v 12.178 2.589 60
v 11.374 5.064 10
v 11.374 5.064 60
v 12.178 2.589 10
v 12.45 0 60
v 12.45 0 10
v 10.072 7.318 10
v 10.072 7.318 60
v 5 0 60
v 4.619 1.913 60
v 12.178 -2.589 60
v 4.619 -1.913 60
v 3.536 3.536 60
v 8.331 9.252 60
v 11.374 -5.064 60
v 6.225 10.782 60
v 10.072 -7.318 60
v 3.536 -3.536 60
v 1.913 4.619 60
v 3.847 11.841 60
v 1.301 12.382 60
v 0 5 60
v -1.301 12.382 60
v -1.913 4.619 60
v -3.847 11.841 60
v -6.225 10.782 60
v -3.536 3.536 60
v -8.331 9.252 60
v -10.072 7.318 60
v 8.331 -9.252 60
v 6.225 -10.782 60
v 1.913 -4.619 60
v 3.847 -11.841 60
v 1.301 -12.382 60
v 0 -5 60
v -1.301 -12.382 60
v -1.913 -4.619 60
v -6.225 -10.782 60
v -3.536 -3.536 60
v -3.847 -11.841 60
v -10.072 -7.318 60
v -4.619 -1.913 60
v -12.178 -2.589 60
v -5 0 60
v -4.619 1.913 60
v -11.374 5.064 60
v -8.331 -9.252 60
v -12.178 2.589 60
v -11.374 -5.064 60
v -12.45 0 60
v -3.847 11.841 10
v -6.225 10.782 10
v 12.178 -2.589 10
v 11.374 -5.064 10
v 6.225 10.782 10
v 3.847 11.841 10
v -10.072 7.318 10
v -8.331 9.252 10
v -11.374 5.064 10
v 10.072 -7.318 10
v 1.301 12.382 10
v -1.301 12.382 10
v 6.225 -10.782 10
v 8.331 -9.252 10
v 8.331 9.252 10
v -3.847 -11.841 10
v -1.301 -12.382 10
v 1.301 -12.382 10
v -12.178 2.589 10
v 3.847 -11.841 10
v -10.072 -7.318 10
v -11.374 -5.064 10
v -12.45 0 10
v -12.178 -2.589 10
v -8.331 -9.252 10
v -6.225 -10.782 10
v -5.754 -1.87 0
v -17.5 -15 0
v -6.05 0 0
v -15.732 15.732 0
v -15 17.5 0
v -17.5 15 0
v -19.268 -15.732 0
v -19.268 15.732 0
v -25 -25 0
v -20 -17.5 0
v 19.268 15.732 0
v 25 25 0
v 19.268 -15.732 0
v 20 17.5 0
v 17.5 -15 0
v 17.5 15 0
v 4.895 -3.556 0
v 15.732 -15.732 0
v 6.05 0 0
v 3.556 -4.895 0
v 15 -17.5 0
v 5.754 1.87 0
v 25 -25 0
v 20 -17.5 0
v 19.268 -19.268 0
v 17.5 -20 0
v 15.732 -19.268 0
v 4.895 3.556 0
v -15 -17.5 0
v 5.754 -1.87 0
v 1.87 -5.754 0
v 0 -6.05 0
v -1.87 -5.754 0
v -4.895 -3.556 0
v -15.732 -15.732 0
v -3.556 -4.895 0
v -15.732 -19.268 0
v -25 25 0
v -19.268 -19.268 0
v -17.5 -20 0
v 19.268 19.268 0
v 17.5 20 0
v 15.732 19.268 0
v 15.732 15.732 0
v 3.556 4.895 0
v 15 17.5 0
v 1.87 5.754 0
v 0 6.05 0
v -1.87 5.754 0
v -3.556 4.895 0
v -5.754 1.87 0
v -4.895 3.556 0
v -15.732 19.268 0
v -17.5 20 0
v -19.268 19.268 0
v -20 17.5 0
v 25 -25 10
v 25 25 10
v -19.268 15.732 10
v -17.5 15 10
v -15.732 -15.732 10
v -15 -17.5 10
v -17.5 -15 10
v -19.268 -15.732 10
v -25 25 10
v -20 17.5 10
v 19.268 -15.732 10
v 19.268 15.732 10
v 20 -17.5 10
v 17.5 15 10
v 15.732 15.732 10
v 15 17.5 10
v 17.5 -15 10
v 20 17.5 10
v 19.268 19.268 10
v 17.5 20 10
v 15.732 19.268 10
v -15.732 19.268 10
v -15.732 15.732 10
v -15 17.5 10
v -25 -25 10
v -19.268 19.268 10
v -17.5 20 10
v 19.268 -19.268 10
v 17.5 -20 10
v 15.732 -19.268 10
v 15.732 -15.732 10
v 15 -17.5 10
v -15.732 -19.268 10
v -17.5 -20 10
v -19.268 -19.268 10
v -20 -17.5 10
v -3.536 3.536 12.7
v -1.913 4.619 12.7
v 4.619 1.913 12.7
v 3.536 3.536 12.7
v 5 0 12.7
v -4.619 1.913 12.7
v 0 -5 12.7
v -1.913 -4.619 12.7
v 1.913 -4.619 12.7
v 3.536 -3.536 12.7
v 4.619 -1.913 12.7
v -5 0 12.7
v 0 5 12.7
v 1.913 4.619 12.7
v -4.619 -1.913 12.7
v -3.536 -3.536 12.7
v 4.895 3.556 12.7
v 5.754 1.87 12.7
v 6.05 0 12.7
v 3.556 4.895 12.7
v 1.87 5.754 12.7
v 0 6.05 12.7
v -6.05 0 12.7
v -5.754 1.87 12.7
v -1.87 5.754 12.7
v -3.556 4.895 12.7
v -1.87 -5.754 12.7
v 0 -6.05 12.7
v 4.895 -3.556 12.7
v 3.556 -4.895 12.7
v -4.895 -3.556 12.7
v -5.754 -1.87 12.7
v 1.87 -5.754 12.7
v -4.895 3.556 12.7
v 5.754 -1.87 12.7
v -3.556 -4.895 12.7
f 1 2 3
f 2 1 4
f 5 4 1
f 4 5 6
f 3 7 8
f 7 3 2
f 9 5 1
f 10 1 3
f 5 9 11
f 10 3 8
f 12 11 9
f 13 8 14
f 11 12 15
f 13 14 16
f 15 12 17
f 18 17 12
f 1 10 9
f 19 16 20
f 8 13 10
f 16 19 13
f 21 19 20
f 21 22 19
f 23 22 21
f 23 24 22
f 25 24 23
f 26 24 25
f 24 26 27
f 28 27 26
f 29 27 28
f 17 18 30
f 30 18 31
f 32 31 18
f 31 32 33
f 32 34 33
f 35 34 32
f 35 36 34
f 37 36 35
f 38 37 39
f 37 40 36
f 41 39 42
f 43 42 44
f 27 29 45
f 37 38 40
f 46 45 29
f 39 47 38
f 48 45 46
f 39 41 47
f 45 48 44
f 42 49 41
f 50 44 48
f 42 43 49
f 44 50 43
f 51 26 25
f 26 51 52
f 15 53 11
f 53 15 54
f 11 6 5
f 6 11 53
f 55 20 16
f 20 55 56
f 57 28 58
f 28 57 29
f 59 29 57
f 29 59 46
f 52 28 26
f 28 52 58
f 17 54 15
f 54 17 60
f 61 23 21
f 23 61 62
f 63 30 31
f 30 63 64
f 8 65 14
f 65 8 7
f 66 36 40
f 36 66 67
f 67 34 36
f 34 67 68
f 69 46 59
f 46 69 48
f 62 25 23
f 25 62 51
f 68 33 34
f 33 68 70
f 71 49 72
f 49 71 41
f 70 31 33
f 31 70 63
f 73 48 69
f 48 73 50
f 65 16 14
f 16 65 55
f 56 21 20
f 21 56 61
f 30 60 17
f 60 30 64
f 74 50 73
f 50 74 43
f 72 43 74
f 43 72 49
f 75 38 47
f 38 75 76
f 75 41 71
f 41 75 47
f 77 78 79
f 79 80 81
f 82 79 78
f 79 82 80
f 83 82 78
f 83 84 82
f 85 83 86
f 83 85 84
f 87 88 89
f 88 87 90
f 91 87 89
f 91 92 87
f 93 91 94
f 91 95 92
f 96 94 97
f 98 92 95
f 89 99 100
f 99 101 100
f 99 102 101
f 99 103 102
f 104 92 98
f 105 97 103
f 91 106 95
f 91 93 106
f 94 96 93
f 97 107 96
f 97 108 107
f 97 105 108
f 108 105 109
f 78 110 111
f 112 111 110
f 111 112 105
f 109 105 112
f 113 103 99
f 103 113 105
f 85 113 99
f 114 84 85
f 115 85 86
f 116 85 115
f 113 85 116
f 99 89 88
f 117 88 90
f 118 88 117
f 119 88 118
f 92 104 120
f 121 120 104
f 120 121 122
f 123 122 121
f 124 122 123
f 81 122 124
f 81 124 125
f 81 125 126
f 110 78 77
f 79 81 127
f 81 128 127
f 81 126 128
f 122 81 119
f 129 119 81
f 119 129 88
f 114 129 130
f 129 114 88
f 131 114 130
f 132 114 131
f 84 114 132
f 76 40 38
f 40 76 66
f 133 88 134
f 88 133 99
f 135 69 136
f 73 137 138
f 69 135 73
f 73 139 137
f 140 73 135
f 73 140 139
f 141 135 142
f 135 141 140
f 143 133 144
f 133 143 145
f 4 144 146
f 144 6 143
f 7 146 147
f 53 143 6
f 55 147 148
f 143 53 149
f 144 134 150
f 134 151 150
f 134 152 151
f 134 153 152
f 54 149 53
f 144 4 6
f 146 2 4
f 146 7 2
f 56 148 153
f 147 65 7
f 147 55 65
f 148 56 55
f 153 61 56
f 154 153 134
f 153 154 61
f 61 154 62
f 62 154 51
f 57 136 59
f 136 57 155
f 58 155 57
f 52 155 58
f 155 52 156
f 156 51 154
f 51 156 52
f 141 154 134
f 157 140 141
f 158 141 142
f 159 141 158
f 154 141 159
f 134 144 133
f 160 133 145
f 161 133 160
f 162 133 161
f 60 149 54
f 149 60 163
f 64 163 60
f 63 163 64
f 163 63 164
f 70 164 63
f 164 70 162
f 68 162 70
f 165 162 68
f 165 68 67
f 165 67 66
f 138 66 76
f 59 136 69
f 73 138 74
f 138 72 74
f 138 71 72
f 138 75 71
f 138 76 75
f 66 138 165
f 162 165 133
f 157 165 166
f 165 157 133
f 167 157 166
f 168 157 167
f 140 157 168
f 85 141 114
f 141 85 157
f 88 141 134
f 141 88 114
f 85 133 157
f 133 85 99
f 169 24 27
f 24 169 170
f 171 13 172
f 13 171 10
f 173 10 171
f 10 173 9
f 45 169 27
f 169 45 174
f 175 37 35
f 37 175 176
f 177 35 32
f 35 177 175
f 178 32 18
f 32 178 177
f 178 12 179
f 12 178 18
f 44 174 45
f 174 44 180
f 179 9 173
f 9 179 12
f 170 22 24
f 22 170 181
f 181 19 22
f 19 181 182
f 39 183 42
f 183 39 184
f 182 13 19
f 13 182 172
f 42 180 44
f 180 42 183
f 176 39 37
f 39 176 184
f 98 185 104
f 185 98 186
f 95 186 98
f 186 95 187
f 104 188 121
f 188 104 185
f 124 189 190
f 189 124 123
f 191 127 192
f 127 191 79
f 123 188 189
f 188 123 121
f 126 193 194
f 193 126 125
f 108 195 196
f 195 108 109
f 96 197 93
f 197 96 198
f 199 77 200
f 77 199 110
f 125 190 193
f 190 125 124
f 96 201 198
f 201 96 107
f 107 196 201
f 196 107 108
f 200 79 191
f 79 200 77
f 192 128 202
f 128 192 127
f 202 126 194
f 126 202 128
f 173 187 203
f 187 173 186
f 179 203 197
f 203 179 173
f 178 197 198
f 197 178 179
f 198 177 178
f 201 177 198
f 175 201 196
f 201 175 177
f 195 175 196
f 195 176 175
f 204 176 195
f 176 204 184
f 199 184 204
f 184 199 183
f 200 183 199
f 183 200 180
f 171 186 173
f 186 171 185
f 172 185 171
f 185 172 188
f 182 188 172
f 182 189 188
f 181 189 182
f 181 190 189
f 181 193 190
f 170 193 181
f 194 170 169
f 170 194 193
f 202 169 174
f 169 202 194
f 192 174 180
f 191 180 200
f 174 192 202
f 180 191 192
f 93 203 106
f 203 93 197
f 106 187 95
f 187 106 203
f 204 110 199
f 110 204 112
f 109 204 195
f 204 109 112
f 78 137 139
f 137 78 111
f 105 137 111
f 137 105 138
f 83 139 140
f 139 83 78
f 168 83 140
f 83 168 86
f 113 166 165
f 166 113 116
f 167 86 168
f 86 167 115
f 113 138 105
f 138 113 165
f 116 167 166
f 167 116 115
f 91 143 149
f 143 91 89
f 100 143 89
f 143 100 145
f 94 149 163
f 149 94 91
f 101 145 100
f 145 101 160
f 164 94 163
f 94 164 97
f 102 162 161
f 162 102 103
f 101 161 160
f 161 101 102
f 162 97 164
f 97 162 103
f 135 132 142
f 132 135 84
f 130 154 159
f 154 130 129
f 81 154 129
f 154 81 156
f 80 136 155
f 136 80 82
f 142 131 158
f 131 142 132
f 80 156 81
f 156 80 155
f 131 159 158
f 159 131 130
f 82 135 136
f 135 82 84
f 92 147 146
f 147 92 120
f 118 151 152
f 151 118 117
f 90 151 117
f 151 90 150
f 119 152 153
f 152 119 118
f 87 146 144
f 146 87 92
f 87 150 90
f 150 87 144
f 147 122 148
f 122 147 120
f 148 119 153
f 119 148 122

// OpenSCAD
// units in mm
// optics light tube for Akash

// editable
post_diameter_nominal = 25;
post_d_fudge = -0.1;

post_height = 60;

platexy = 50;
plate_t = 10;
inner_d = 10;

colm_diameter_nominal = 12;
colm_d_fudge = 0.1;
colm_h = 12.7;

mount_hole_d = 5;
hole_offset = 15;



// calculated
post_d = post_diameter_nominal + post_d_fudge;
colm_d = colm_diameter_nominal + colm_d_fudge;
holexy = platexy - hole_offset;

// geometry
difference(){
    union(){
        cylinder(d=post_d, h=post_height);
        translate([0,0,plate_t/2]) cube([platexy, platexy, plate_t],center=true);
    }
    cylinder(d=inner_d, h=post_height);
    cylinder(d=colm_d, h=colm_h);
    
    translate([-holexy/2,-holexy/2,0]) cylinder(d=mount_hole_d, h=plate_t);
    translate([ holexy/2,-holexy/2,0]) cylinder(d=mount_hole_d, h=plate_t);
    translate([-holexy/2, holexy/2,0]) cylinder(d=mount_hole_d, h=plate_t);
    translate([ holexy/2, holexy/2,0]) cylinder(d=mount_hole_d, h=plate_t);

}
